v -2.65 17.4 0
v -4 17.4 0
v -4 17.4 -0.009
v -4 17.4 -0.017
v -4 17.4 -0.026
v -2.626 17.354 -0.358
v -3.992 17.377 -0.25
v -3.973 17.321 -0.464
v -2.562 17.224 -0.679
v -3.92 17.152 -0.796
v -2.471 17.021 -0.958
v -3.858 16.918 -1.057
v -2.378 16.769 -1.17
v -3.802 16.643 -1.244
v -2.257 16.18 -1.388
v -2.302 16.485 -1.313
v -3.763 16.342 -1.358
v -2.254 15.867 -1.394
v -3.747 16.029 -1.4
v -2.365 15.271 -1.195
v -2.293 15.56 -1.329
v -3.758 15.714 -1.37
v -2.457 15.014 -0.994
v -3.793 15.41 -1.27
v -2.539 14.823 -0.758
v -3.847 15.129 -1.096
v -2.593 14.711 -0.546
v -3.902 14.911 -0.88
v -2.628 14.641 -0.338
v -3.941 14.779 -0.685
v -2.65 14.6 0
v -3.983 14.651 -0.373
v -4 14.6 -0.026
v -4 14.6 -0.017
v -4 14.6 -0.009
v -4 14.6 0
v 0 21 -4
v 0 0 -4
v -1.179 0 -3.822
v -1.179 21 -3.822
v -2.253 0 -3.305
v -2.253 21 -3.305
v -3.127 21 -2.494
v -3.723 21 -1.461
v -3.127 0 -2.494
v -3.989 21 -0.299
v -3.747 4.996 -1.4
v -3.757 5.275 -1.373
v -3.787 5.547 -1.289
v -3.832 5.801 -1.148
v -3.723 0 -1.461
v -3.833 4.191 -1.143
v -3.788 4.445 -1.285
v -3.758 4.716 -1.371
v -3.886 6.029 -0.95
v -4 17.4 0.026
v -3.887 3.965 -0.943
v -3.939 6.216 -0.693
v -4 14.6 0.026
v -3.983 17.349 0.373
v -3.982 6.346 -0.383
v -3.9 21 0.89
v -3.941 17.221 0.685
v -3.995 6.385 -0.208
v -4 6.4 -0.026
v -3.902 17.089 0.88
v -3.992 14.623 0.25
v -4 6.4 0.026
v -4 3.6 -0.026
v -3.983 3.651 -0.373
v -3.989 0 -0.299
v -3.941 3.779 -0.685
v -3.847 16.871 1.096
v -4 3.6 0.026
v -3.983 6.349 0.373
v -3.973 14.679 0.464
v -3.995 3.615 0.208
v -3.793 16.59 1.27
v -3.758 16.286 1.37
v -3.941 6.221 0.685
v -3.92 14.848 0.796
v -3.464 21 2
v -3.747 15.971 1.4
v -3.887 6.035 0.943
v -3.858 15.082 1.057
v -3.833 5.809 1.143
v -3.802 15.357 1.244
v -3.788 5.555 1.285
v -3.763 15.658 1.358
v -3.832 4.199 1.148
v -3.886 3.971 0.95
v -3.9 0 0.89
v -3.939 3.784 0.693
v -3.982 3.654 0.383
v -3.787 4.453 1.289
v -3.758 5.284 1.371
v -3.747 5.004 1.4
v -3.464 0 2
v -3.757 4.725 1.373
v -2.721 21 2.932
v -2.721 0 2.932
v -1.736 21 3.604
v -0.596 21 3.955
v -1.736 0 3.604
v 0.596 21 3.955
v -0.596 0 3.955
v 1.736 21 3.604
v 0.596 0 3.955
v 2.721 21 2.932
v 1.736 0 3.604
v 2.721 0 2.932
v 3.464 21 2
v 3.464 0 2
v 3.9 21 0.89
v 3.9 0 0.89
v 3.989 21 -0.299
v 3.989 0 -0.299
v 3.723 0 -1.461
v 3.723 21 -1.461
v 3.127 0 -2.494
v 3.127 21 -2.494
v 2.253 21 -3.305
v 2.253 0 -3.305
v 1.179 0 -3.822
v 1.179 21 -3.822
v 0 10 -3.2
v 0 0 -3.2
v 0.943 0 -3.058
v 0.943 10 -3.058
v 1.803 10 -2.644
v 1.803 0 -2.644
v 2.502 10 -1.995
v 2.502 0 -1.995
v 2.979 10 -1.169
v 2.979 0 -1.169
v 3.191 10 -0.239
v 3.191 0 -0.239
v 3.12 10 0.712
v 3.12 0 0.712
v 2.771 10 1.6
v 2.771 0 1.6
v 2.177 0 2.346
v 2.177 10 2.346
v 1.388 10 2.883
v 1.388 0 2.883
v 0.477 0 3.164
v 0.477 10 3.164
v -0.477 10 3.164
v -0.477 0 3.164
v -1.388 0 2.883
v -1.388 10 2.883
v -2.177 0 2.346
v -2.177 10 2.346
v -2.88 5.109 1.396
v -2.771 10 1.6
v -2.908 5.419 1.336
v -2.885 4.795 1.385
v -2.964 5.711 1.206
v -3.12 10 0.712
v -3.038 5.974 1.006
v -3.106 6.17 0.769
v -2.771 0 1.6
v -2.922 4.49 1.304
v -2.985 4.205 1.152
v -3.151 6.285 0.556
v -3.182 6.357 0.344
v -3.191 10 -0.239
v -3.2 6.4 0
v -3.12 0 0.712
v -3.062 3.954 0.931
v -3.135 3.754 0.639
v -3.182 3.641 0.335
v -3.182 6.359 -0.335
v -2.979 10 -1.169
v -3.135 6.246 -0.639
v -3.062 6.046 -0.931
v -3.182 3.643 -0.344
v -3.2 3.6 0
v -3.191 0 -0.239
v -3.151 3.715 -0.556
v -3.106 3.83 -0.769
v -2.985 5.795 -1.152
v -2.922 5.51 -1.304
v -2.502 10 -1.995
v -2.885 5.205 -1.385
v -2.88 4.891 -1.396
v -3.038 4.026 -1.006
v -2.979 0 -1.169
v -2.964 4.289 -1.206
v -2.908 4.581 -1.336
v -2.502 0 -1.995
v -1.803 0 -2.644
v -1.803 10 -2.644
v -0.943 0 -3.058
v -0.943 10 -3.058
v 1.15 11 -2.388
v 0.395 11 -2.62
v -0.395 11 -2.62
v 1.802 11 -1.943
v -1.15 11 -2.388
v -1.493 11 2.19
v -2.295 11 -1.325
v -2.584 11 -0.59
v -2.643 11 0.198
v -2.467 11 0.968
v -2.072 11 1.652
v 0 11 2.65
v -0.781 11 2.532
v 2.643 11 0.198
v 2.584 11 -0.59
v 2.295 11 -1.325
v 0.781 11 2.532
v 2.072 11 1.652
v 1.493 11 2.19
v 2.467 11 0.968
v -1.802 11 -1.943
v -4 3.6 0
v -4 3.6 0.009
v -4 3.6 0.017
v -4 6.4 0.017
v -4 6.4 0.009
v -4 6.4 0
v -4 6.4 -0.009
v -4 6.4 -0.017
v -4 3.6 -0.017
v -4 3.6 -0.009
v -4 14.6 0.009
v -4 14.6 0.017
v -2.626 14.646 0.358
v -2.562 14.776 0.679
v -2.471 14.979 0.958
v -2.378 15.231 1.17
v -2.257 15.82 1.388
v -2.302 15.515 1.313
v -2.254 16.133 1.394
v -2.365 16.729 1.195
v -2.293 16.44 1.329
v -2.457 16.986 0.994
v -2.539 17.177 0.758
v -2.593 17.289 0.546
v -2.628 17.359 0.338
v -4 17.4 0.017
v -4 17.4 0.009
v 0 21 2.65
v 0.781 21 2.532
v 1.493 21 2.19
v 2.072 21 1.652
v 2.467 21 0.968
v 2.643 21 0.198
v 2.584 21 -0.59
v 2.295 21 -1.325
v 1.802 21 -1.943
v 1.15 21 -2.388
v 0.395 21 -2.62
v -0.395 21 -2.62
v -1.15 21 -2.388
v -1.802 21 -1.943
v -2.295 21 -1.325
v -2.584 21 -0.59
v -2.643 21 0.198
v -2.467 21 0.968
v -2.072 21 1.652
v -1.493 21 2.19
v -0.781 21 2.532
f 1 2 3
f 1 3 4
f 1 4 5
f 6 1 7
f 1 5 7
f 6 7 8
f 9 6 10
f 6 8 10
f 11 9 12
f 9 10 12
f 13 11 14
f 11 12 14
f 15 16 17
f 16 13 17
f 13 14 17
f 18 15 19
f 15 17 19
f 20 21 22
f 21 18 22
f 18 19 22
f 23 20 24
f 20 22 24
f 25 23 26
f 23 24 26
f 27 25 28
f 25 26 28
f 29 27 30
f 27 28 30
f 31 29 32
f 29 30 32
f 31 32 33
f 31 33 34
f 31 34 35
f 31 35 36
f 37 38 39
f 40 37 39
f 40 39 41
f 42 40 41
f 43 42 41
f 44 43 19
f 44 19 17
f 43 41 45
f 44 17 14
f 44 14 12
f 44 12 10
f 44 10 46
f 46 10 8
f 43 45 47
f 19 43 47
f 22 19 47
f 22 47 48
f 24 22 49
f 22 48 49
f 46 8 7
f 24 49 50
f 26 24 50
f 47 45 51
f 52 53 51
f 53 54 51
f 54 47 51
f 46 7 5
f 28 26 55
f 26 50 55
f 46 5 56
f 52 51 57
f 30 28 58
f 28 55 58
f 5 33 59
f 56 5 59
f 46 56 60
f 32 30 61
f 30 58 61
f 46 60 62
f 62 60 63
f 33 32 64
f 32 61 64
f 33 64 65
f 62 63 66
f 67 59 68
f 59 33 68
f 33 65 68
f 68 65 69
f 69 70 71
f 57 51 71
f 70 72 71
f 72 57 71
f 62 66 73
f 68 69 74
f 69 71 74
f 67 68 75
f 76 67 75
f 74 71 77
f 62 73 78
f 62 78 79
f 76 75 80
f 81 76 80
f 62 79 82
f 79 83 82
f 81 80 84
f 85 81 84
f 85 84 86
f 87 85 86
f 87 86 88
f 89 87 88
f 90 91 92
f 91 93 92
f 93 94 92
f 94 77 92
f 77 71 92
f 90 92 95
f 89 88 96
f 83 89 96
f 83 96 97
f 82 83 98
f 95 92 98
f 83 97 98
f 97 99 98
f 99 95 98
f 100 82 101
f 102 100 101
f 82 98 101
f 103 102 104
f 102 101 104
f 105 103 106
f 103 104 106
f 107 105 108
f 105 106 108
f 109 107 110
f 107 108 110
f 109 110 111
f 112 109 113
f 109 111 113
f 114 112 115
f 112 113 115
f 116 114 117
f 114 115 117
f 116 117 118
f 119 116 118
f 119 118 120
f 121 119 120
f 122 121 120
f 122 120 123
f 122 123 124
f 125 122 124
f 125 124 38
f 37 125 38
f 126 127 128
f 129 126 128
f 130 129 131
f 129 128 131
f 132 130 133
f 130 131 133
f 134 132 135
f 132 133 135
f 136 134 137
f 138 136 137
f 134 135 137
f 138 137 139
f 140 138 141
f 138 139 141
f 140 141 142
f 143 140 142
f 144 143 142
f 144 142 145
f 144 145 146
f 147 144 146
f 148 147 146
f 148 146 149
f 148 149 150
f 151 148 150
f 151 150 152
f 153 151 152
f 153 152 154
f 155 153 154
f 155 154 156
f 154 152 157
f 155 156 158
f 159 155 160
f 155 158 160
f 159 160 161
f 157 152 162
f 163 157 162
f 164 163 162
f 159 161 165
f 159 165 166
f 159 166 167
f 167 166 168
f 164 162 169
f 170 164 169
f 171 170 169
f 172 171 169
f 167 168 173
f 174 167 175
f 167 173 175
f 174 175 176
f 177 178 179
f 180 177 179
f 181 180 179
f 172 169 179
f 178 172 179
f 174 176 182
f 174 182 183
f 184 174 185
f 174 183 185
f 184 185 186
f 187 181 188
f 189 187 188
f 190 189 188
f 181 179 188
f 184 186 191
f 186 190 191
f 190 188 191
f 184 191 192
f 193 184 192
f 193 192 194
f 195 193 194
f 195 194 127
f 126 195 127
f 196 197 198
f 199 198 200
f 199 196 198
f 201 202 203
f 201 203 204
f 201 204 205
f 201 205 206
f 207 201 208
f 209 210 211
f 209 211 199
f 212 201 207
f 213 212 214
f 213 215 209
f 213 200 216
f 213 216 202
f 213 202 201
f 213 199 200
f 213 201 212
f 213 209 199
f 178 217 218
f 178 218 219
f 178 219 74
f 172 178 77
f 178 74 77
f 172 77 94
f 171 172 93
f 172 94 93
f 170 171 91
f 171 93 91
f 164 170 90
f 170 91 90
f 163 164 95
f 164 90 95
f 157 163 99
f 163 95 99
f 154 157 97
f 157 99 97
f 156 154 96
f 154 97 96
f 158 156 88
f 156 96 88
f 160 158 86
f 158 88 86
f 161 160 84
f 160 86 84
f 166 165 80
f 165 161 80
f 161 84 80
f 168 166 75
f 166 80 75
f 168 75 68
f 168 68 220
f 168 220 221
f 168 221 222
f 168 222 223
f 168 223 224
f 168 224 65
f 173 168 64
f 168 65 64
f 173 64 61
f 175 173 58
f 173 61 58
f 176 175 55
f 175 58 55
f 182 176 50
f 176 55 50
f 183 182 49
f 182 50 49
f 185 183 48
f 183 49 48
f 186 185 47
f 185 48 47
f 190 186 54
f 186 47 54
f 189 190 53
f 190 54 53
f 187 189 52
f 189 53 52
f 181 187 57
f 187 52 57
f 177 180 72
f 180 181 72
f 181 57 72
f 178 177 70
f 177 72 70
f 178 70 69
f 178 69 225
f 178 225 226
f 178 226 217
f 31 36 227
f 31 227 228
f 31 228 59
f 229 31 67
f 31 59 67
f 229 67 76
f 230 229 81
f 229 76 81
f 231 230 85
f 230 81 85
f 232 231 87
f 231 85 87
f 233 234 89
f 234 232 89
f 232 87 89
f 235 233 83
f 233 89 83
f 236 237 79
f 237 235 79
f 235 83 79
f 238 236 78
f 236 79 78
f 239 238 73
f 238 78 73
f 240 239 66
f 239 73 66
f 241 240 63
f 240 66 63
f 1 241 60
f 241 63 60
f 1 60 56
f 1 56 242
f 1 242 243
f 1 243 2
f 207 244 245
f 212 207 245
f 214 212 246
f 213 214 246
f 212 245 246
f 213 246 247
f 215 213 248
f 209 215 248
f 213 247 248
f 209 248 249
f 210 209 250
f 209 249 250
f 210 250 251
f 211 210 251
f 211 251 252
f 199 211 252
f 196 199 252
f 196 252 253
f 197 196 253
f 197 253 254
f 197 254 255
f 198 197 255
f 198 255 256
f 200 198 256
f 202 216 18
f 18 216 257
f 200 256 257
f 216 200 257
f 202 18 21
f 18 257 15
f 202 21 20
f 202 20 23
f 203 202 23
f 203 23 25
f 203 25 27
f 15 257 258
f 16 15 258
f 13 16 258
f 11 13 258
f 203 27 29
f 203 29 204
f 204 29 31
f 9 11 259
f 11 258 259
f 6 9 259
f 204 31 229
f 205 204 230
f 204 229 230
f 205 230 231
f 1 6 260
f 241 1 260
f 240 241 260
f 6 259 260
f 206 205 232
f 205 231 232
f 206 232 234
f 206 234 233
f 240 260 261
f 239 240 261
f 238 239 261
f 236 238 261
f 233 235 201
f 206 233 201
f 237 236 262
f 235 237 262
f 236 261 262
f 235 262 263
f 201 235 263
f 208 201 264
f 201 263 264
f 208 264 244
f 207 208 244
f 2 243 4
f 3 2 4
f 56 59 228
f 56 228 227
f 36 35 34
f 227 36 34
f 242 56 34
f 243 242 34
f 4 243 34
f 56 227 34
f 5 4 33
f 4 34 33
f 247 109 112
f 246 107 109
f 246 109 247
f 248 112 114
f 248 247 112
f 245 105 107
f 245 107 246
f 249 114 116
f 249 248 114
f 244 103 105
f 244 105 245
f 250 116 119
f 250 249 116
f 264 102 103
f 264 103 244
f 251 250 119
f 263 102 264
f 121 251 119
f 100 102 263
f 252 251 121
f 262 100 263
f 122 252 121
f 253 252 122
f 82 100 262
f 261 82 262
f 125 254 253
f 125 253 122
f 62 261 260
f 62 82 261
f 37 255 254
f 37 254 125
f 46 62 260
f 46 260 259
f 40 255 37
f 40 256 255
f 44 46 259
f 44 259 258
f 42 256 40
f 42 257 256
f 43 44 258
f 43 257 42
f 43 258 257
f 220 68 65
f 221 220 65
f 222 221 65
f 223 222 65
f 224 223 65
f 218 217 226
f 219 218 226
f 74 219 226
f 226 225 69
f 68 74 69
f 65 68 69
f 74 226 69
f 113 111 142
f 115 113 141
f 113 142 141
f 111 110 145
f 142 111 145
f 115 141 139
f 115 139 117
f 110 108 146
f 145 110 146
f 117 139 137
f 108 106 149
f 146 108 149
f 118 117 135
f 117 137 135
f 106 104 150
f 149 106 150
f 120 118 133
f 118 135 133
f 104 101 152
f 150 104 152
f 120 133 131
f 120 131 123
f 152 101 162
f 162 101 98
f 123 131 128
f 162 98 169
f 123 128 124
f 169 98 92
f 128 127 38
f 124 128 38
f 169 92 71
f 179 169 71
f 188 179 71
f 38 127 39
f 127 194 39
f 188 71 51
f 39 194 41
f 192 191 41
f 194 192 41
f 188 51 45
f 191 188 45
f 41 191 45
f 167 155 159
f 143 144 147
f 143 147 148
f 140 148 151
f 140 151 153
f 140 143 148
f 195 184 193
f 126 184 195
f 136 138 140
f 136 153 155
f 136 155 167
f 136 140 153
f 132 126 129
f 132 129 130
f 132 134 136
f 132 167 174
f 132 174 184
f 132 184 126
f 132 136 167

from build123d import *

# Parameters (mm, degrees)
SKETCH1_R           = 4
BOSS_EXTRUDE1_DEPTH = 21
SKETCH2_R           = 3.2
CUT_EXTRUDE1_DEPTH  = 10
SKETCH3_R           = 2.65
CUT_EXTRUDE3_DEPTH  = 10


with BuildPart() as part:
    # Sketch1 → Boss-Extrude1 (new body)
    with BuildSketch(Plane(origin=(0, 0, 0), x_dir=(1, 0, 0), z_dir=(0, 1, 0))):
        with Locations(Location((0, 0, 0), (0, 0, 90))):
            Circle(SKETCH1_R)
    extrude(amount=BOSS_EXTRUDE1_DEPTH)

    # Sketch2 → Cut-Extrude1 (cut)
    with BuildSketch(Plane.XZ):
        with Locations(Location((0, 0, 0), (0, 0, 270))):
            Circle(SKETCH2_R)
    extrude(amount=-CUT_EXTRUDE1_DEPTH, mode=Mode.SUBTRACT)

    # Sketch3 → Cut-Extrude3 (cut)
    with BuildSketch(Plane(origin=(0, 21, 0), x_dir=(1, 0, 0), z_dir=(0, 1, 0))):
        with Locations(Location((0, 0, 0), (0, 0, 270))):
            Circle(SKETCH3_R)
    extrude(amount=-CUT_EXTRUDE3_DEPTH, mode=Mode.SUBTRACT)

    # Cut-Extrude5: read off the stored shape, not the designer's step
    # Cut-Extrude5: loft between two sections, ruled curve by curve
    cut_extrude5_from = [
        Edge.make_three_point_arc((-2.24981464, 14.6, 0), (-2.24981464, 16, 1.4), (-2.24981464, 17.4, 0)),
        Edge.make_three_point_arc((-2.24981464, 17.4, 0), (-2.24981464, 16, -1.4), (-2.24981464, 14.6, 0)),
    ]
    cut_extrude5_to = [
        Edge.make_three_point_arc((-3.999916451, 14.6, 0), (-3.999916451, 16, 1.4), (-3.999916451, 17.4, 0)),
        Edge.make_three_point_arc((-3.999916451, 17.4, 0), (-3.999916451, 16, -1.4), (-3.999916451, 14.6, 0)),
    ]
    cut_extrude5 = Solid(Shell([*[Face.make_surface_from_curves(cut_extrude5_from[k], cut_extrude5_to[k]) for k in range(2)], Face(Wire(cut_extrude5_from)), Face(Wire(cut_extrude5_to))]))
    add(cut_extrude5, mode=Mode.SUBTRACT)

    # Cut-Extrude5 2: loft between two sections, ruled curve by curve
    cut_extrude5_2_from = [
        Edge.make_three_point_arc((-2.877351837, 3.6, 0), (-2.877351837, 5, 1.4), (-2.877351837, 6.4, 0)),
        Edge.make_three_point_arc((-2.877351837, 6.4, 0), (-2.877351837, 5, -1.4), (-2.877351837, 3.6, 0)),
    ]
    cut_extrude5_2_to = [
        Edge.make_three_point_arc((-3.999916451, 3.6, 0), (-3.999916451, 5, 1.4), (-3.999916451, 6.4, 0)),
        Edge.make_three_point_arc((-3.999916451, 6.4, 0), (-3.999916451, 5, -1.4), (-3.999916451, 3.6, 0)),
    ]
    cut_extrude5_2 = Solid(Shell([*[Face.make_surface_from_curves(cut_extrude5_2_from[k], cut_extrude5_2_to[k]) for k in range(2)], Face(Wire(cut_extrude5_2_from)), Face(Wire(cut_extrude5_2_to))]))
    add(cut_extrude5_2, mode=Mode.SUBTRACT)


solid = part.part
